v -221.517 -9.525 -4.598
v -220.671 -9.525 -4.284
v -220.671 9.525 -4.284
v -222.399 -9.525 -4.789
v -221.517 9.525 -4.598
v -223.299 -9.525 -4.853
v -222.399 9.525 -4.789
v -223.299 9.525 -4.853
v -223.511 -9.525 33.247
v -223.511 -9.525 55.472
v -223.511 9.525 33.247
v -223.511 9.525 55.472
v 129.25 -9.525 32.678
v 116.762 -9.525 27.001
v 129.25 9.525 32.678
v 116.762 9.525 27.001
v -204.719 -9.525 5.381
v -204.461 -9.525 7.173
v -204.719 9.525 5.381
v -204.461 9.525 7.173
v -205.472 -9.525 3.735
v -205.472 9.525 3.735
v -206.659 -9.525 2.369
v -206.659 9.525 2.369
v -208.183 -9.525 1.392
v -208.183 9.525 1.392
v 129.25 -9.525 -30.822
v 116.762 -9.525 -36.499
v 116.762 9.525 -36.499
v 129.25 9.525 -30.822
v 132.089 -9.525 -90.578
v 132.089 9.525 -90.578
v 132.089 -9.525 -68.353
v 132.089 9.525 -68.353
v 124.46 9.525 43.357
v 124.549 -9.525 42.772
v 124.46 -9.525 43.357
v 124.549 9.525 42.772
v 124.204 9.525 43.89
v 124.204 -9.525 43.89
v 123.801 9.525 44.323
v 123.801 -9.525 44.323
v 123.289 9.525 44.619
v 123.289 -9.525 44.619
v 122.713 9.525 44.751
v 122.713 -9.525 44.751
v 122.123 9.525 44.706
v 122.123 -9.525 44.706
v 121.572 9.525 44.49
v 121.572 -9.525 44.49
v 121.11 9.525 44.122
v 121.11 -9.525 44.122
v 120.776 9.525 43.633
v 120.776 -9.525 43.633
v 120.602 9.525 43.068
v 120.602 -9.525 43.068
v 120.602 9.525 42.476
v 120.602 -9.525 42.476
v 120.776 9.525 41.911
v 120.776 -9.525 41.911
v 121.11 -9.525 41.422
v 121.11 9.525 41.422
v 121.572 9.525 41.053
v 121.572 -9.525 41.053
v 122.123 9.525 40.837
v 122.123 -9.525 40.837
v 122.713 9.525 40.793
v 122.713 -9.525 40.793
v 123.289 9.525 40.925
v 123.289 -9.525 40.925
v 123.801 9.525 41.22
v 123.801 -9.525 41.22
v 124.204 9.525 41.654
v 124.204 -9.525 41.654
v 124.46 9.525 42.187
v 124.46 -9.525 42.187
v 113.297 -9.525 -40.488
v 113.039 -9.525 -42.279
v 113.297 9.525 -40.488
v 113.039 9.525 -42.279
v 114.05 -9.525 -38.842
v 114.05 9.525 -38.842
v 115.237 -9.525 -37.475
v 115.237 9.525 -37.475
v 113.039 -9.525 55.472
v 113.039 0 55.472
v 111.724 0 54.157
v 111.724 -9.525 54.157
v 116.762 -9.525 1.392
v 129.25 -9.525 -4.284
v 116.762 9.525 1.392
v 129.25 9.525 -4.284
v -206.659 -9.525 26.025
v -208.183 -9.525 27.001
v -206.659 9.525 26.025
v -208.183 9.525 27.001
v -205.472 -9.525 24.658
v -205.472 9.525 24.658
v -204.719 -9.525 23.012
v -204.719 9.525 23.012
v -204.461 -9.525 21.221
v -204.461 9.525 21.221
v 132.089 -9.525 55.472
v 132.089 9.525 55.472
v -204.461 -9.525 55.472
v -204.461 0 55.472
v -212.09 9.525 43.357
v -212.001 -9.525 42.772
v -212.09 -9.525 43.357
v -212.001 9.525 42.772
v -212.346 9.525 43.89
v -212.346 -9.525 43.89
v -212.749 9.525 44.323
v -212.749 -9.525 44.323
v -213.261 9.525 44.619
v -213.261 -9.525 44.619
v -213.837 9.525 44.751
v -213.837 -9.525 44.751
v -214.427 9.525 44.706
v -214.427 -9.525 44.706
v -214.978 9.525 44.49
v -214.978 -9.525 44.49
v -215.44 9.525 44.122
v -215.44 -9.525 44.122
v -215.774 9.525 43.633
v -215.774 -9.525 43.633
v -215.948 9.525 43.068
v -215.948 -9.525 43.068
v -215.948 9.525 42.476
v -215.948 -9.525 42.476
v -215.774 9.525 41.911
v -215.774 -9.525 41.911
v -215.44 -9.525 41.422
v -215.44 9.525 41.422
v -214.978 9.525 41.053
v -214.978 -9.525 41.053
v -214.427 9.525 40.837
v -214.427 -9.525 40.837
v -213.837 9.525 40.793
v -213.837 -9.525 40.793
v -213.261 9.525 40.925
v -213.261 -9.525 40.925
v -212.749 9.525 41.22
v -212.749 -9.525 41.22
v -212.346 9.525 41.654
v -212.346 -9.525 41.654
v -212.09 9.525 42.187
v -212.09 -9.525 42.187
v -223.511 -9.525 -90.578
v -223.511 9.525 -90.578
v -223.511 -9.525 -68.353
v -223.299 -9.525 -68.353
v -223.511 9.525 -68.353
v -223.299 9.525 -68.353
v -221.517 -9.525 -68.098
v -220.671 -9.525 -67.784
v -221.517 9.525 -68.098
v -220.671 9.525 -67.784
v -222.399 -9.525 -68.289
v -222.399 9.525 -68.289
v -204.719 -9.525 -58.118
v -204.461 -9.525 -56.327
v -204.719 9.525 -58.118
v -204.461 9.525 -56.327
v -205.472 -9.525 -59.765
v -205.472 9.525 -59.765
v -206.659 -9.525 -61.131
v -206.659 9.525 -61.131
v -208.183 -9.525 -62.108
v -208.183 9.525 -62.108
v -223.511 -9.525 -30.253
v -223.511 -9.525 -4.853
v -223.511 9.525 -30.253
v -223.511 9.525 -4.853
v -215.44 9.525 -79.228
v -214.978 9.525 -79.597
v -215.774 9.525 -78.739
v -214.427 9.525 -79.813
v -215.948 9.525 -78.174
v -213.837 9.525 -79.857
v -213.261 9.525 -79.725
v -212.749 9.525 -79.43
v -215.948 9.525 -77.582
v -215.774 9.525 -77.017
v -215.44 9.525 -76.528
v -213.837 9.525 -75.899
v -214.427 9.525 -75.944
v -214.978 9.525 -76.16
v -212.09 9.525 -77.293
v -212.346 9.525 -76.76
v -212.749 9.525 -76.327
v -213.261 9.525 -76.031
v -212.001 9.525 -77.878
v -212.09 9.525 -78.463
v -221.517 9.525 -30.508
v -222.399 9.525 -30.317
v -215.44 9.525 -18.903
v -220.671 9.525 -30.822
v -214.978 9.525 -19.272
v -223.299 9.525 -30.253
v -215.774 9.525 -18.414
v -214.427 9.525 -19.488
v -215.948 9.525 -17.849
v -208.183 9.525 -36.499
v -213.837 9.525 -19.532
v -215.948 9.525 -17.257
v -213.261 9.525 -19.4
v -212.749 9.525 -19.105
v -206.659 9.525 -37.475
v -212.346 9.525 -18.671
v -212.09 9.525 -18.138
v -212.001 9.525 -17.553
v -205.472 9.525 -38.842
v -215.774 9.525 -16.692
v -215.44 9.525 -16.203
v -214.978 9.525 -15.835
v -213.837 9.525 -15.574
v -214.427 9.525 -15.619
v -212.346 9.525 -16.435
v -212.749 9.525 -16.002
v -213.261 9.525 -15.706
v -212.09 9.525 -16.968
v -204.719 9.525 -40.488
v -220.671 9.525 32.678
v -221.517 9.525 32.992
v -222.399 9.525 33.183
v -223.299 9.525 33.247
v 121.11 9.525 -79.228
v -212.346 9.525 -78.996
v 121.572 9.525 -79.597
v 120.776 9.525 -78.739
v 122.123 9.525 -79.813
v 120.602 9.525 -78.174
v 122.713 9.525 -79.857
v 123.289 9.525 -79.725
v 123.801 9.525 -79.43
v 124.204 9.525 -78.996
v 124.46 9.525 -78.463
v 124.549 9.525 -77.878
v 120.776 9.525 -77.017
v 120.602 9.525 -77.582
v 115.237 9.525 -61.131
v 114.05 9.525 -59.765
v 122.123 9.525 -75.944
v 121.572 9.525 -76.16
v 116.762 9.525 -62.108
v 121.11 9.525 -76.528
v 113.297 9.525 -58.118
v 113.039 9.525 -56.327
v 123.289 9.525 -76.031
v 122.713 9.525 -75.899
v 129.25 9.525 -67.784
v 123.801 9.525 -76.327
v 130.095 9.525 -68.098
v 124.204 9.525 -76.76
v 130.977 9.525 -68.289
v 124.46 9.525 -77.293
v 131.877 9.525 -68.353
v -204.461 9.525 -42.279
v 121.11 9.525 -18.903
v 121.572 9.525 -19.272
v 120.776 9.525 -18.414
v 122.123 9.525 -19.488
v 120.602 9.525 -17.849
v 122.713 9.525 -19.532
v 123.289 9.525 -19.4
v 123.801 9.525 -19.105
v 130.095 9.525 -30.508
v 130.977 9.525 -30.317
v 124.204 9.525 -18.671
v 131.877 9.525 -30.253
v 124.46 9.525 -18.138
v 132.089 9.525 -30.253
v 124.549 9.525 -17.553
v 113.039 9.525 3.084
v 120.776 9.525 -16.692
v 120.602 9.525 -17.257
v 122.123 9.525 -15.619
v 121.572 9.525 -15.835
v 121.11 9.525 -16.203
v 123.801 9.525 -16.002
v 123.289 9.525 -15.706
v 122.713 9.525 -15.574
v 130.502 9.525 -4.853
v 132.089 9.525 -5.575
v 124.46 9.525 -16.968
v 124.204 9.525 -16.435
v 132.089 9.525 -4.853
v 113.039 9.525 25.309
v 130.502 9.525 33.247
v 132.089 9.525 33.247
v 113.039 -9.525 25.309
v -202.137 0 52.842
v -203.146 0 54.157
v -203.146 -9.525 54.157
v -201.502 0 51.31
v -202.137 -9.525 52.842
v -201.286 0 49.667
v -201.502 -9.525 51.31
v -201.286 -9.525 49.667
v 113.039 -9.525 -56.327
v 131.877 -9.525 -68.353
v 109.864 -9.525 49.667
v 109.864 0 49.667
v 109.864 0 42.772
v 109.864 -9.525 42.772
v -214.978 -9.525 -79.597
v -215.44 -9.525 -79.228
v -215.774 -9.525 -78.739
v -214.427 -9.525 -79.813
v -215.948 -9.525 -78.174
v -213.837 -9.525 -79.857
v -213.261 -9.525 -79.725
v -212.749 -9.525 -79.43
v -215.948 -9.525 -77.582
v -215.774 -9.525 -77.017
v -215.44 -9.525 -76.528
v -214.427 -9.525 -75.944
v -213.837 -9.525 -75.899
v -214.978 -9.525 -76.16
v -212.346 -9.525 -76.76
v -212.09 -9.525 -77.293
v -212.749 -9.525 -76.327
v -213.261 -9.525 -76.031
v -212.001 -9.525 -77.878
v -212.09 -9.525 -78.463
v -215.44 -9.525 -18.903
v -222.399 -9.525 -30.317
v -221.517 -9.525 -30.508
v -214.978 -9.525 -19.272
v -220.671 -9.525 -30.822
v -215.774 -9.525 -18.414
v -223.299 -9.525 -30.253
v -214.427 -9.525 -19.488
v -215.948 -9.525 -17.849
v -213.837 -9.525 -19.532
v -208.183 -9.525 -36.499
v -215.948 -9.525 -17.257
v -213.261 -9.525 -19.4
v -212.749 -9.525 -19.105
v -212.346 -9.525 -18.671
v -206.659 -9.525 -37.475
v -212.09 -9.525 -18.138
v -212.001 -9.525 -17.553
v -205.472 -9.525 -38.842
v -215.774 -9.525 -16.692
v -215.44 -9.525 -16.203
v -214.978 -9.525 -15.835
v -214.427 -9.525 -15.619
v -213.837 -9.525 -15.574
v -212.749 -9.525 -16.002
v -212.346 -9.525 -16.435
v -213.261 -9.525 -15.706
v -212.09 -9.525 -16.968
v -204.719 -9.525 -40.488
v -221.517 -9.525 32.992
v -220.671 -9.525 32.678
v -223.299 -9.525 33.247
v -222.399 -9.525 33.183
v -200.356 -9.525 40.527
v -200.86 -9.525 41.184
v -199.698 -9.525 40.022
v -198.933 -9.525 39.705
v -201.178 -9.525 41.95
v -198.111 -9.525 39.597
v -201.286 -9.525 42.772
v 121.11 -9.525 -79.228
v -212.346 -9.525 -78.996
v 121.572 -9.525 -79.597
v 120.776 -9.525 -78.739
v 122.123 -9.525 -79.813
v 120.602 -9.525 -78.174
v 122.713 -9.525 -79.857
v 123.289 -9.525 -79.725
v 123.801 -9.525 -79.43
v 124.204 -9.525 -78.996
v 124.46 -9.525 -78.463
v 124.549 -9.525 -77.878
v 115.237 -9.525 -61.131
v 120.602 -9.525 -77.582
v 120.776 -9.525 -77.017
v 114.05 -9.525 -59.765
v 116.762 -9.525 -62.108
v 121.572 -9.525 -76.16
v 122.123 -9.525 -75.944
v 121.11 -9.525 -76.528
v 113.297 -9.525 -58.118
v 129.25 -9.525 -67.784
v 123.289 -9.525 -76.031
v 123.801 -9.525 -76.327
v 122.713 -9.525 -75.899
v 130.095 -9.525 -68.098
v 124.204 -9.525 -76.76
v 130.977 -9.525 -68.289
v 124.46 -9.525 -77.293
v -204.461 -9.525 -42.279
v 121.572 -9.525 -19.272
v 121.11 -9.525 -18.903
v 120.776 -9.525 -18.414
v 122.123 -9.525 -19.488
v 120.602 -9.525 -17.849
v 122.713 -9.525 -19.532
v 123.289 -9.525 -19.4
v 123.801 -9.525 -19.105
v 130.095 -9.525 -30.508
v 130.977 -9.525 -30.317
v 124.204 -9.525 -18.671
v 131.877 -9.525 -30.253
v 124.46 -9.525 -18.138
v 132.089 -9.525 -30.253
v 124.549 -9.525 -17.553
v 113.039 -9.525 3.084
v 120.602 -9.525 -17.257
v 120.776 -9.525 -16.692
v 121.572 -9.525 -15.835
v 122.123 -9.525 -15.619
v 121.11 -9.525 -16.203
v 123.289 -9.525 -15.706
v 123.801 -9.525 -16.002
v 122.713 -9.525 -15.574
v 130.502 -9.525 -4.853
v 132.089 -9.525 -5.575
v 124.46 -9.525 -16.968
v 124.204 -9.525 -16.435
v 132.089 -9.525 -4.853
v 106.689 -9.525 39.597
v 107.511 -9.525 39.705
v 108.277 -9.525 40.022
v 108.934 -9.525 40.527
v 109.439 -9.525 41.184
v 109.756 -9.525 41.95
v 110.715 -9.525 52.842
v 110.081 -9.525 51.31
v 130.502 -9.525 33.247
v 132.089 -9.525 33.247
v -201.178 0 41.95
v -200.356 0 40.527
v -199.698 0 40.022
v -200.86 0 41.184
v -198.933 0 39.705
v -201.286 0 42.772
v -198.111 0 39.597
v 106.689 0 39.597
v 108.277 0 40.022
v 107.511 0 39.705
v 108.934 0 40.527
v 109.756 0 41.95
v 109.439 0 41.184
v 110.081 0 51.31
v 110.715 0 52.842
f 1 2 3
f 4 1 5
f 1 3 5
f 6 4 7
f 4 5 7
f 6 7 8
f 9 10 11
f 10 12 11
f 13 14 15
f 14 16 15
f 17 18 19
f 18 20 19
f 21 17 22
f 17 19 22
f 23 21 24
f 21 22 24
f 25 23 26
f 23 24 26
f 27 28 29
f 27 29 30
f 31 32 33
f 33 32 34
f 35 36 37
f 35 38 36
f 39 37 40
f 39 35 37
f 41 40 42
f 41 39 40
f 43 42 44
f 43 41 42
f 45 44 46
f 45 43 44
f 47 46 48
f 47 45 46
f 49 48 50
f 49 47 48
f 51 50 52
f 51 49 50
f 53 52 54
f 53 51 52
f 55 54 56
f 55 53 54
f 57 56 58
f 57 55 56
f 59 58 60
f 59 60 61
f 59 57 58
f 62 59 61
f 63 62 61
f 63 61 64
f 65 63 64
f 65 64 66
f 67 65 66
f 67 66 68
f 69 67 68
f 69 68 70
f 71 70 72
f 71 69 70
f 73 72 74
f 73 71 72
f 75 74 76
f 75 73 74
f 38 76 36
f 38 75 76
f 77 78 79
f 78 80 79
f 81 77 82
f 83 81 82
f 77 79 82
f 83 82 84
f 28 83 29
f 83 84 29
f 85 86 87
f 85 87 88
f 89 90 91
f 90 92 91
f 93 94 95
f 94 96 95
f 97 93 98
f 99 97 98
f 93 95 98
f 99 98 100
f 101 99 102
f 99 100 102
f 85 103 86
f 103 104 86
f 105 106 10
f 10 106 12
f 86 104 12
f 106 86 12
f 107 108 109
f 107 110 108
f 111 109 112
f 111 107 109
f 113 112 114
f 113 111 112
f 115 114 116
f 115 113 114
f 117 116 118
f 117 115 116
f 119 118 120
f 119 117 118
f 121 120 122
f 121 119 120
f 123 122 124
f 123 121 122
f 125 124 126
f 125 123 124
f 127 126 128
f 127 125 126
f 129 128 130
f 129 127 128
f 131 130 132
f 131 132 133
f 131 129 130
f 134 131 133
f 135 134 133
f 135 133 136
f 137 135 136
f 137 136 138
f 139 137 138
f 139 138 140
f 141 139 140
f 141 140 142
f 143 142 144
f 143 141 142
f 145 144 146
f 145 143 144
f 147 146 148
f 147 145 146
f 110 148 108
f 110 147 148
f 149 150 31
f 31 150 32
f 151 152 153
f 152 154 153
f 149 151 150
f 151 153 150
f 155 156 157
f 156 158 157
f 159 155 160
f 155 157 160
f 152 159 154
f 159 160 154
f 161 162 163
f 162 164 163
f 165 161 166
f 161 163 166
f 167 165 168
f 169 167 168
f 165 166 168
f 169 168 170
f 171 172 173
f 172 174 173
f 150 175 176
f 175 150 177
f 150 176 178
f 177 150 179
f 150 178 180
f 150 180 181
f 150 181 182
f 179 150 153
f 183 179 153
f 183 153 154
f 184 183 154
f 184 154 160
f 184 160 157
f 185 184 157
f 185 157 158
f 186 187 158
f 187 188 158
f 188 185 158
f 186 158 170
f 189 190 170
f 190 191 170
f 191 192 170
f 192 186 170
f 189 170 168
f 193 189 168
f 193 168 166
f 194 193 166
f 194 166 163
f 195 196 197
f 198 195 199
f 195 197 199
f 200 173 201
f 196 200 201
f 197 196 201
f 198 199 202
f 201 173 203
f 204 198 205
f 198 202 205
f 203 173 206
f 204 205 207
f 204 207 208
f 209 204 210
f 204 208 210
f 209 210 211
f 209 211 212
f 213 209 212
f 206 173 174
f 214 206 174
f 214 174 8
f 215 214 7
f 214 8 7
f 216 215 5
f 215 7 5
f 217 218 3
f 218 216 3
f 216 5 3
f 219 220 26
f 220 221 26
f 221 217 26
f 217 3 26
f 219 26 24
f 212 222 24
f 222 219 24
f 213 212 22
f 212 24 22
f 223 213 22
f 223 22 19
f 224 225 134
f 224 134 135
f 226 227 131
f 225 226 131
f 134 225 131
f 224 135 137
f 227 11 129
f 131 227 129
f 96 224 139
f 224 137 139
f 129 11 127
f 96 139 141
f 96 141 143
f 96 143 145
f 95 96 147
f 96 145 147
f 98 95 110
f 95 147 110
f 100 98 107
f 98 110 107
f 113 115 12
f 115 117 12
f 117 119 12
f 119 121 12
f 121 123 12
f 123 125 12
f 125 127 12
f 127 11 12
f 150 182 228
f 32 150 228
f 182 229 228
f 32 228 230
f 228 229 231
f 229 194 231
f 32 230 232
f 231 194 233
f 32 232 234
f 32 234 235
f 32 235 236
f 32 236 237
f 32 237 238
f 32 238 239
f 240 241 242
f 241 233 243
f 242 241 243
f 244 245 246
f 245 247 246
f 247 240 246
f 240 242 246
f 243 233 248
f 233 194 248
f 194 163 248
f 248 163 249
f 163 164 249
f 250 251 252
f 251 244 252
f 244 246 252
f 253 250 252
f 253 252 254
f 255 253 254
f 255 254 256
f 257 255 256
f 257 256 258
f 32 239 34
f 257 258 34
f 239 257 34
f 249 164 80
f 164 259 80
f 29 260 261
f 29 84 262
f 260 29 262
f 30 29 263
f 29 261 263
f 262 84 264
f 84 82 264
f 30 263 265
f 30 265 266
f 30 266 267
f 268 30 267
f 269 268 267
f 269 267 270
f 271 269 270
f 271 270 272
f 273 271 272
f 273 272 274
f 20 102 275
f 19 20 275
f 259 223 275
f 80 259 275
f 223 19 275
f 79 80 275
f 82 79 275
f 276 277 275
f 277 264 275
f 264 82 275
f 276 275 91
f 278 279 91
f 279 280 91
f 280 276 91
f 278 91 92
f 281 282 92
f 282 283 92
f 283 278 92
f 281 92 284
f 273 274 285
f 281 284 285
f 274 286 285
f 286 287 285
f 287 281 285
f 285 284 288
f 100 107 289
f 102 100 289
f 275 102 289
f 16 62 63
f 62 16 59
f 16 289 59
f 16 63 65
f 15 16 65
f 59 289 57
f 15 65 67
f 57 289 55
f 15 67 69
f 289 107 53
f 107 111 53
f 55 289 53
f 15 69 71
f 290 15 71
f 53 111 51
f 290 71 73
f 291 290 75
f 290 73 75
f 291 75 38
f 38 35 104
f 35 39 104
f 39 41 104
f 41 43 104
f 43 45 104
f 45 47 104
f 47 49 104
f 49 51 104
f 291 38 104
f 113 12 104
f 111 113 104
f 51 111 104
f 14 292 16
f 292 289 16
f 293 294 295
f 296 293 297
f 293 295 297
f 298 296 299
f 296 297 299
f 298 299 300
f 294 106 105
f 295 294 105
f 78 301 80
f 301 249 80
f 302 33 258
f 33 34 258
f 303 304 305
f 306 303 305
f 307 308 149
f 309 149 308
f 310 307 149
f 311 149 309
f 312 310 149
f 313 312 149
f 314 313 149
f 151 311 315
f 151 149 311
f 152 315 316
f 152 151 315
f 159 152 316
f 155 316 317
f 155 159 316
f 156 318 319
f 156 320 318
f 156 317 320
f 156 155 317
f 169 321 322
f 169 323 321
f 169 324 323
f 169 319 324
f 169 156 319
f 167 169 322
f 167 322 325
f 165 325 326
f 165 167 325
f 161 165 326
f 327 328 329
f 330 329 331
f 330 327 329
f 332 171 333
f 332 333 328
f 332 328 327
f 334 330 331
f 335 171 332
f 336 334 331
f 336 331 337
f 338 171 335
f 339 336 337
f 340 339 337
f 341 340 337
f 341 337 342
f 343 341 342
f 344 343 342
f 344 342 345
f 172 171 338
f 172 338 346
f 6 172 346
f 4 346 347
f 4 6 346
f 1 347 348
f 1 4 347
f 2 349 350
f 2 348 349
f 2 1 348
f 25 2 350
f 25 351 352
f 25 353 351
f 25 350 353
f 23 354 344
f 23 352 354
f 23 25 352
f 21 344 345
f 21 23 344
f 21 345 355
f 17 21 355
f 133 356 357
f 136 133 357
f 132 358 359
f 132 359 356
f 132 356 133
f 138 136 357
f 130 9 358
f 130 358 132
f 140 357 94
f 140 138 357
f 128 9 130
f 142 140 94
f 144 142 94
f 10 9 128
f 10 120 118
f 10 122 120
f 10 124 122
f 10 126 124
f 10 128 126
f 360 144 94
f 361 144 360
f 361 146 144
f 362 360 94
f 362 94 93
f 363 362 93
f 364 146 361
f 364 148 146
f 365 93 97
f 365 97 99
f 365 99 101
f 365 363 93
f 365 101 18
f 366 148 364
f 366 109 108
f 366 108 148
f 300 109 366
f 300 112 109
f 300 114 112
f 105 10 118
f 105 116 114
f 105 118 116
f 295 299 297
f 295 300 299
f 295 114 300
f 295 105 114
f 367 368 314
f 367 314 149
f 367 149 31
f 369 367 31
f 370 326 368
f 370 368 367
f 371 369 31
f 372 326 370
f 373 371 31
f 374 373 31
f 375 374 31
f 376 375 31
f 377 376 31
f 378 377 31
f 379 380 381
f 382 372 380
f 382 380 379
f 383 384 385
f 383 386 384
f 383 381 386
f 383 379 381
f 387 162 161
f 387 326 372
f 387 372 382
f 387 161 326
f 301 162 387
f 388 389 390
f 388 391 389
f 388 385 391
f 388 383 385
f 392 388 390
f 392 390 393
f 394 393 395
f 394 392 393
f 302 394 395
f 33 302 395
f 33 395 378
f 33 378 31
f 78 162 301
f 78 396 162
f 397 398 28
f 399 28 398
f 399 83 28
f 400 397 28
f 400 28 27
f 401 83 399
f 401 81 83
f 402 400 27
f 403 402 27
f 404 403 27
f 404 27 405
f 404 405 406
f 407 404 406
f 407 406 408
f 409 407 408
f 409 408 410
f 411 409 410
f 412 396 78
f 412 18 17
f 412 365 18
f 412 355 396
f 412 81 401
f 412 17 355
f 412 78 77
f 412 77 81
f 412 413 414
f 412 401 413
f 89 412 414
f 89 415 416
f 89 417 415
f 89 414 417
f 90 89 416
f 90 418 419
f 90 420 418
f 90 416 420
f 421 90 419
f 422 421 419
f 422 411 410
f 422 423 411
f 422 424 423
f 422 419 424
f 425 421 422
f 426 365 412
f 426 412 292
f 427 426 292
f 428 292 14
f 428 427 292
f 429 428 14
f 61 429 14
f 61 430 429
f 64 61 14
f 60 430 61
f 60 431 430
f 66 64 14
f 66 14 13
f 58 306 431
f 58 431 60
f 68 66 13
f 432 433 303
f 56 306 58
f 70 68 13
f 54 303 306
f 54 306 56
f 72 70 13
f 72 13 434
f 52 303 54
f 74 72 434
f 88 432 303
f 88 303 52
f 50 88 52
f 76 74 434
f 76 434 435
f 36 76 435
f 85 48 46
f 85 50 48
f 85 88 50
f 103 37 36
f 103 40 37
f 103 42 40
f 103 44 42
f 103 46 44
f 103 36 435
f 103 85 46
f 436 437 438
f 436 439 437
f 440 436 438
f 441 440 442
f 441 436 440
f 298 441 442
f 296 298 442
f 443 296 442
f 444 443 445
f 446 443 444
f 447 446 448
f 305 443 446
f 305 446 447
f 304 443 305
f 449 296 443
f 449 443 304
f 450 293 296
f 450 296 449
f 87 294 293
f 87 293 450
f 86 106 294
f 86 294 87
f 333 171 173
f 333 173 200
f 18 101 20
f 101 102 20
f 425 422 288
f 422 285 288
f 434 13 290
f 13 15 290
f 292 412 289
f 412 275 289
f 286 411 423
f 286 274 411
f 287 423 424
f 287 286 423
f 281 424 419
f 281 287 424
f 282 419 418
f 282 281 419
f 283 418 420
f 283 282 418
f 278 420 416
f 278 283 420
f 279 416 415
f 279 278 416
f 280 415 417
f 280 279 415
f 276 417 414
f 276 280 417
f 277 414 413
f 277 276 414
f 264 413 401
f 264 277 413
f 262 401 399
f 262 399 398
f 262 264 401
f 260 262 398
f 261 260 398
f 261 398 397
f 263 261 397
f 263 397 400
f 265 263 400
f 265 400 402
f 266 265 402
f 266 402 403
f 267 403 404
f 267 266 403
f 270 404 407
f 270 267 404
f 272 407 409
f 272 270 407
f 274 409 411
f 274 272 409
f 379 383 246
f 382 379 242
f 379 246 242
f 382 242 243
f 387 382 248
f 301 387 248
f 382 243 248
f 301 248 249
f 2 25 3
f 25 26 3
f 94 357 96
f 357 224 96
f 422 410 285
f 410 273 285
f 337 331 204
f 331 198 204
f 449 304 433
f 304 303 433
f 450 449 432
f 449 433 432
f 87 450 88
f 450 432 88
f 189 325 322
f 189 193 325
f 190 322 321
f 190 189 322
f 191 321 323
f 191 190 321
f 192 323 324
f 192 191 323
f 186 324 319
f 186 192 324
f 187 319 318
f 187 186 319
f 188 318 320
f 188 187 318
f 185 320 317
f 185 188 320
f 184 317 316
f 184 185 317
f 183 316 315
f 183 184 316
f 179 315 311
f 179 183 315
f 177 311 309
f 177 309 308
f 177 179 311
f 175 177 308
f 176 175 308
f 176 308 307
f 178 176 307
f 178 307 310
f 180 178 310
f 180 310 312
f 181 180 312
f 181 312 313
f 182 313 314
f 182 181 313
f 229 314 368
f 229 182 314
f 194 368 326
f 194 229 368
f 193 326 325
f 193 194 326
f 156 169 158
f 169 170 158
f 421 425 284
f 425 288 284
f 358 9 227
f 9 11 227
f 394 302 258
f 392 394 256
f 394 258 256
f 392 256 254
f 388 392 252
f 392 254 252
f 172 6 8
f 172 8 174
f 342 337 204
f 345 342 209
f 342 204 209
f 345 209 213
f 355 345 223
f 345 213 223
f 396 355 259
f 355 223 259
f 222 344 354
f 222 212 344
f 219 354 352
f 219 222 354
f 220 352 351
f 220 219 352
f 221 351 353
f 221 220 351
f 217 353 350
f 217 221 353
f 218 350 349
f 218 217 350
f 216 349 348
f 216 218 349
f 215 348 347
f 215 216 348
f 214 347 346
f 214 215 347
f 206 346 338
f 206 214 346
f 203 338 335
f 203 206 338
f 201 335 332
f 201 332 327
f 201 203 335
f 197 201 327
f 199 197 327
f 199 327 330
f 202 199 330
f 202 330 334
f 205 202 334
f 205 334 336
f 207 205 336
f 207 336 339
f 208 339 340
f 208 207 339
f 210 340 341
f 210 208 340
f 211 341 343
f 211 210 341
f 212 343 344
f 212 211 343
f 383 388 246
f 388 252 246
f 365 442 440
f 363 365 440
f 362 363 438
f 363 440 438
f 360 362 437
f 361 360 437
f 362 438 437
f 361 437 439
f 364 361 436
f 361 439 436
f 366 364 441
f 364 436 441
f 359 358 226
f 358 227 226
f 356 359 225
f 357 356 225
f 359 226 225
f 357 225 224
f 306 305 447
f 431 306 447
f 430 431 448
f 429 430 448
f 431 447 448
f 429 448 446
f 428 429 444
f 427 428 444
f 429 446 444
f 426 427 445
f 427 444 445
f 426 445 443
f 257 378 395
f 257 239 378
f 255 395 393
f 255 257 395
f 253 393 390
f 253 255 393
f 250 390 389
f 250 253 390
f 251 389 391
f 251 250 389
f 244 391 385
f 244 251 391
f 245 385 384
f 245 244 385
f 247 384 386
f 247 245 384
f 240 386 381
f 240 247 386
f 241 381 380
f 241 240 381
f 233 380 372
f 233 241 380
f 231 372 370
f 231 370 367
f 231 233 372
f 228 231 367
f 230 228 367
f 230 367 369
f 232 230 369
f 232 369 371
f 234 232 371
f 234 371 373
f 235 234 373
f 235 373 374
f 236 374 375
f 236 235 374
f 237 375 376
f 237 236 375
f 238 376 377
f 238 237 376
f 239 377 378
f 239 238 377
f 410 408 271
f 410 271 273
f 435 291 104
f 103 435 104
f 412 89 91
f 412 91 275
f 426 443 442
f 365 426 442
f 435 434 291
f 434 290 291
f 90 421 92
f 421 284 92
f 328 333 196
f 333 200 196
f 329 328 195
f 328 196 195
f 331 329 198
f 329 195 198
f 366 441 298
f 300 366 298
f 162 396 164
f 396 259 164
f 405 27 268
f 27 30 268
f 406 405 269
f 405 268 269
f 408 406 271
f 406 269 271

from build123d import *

# Parameters (mm, degrees)
F0_R     = 1.984375
F1_DEPTH = 9.525
F2_DEPTH = 9.525
F3_SIZE  = 3.175
F4_R     = 6.35


# Not quite as in the source:
# - ends of sketch curves that miss each other by under 0.0002 mm in the source are joined


with BuildPart() as f1:
    # F0 (on Front) → F1 (new body)
    with BuildSketch(Plane.XZ):
        with BuildLine():
            ThreePointArc((106.6892375248, 39.5968594302), (108.9343015551, 40.5267953999), (109.8642375248, 42.7718594302))
            Line((109.8642375248, 42.7718594302), (109.8642375248, 55.4718594302))
            Line((109.8642375248, 55.4718594302), (-201.2857624752, 55.4718594302))
            Line((-201.2857624752, 55.4718594302), (-201.2857624752, 42.7718594302))
            ThreePointArc((-201.2857624752, 42.7718594302), (-200.3558265055, 40.5267953999), (-198.1107624752, 39.5968594302))
            Line((-198.1107624752, 39.5968594302), (106.6892375248, 39.5968594302))
        make_face()
        with BuildLine():
            Line((109.8642375248, 55.4718594302), (109.8642375248, 42.7718594302))
            ThreePointArc((109.8642375248, 42.7718594302), (108.9343015551, 40.5267953999), (106.6892375248, 39.5968594302))
            Line((106.6892375248, 39.5968594302), (-198.1107624752, 39.5968594302))
            ThreePointArc((-198.1107624752, 39.5968594302), (-200.3558265055, 40.5267953999), (-201.2857624752, 42.7718594302))
            Line((-201.2857624752, 42.7718594302), (-201.2857624752, 55.4718594302))
            Line((-201.2857624752, 55.4718594302), (-223.5107624752, 55.4718594302))
            Line((-223.5107624752, 55.4718594302), (-223.5107624752, 33.2468594302))
            Line((-223.5107624752, 33.2468594302), (-223.2986885503, 33.2468594302))
            ThreePointArc((-223.2986885503, 33.2468594302), (-221.9543922864, 33.1029344825), (-220.6710339026, 32.6776838569))
            Line((-220.6710339026, 32.6776838569), (-208.1831078275, 27.0013383101))
            ThreePointArc((-208.1831078275, 27.0013383101), (-205.471843717, 24.6583106333), (-204.4607624752, 21.2205138834))
            Line((-204.4607624752, 21.2205138834), (-204.4607624752, 7.1731958926))
            ThreePointArc((-204.4607624752, 7.1731958926), (-205.4718446589, 3.7353976799), (-208.1831109951, 1.392370026))
            Line((-208.1831109951, 1.392370026), (-220.6710352489, -4.2839664363))
            ThreePointArc((-220.6710352489, -4.2839664363), (-221.9543921654, -4.7092159904), (-223.298686729, -4.8531405698))
            Line((-223.298686729, -4.8531405698), (-223.5107370752, -4.8531405698))
            Line((-223.5107370752, -4.8531405698), (-223.5107624752, -30.2531405698))
            Line((-223.5107624752, -30.2531405698), (-223.298686729, -30.2531405698))
            ThreePointArc((-223.298686729, -30.2531405698), (-221.9543921654, -30.3970651492), (-220.6710352489, -30.8223147033))
            Line((-220.6710352489, -30.8223147033), (-208.1831109951, -36.4986511657))
            ThreePointArc((-208.1831109951, -36.4986511657), (-205.4718446589, -38.8416788196), (-204.4607624752, -42.2794770322))
            Line((-204.4607624752, -42.2794770322), (-204.4607624752, -56.326795023))
            ThreePointArc((-204.4607624752, -56.326795023), (-205.471843717, -59.7645917729), (-208.1831078275, -62.1076194497))
            Line((-208.1831078275, -62.1076194497), (-220.6710339026, -67.7839649965))
            ThreePointArc((-220.6710339026, -67.7839649965), (-221.9543922864, -68.2092156221), (-223.2986885503, -68.3531405698))
            Line((-223.2986885503, -68.3531405698), (-223.5107370752, -68.3531405698))
            Line((-223.5107370752, -68.3531405698), (-223.5107624752, -90.5781405698))
            Line((-223.5107624752, -90.5781405698), (132.0892375248, -90.5781405698))
            Line((132.0892375248, -90.5781405698), (132.0892375248, -68.3531405698))
            Line((132.0892375248, -68.3531405698), (131.8771635999, -68.3531405698))
            ThreePointArc((131.8771635999, -68.3531405698), (130.532867336, -68.2092156221), (129.2495089522, -67.7839649965))
            Line((129.2495089522, -67.7839649965), (116.7615828771, -62.1076194497))
            ThreePointArc((116.7615828771, -62.1076194497), (114.0503187666, -59.7645917729), (113.0392375248, -56.326795023))
            Line((113.0392375248, -56.326795023), (113.0392375248, -42.2794770322))
            ThreePointArc((113.0392375248, -42.2794770322), (114.0503197085, -38.8416788196), (116.7615860447, -36.4986511657))
            Line((116.7615860447, -36.4986511657), (129.2495102985, -30.8223147033))
            ThreePointArc((129.2495102985, -30.8223147033), (130.5328672149, -30.3970651492), (131.8771617786, -30.2531405698))
            Line((131.8771617786, -30.2531405698), (132.0892121248, -30.2531405698))
            Line((132.0892121248, -30.2531405698), (132.0892375248, -5.5747531892))
            Line((132.0892375248, -5.5747531892), (130.5016917914, -4.8531405698))
            Line((130.5016917914, -4.8531405698), (129.2495102985, -4.2839664363))
            Line((129.2495102985, -4.2839664363), (116.7615860447, 1.392370026))
            Line((116.7615860447, 1.392370026), (113.0392375248, 3.0843487889))
            Line((113.0392375248, 3.0843487889), (113.0392375248, 7.1731958926))
            Line((113.0392375248, 7.1731958926), (113.0392375248, 21.2205138834))
            Line((113.0392375248, 21.2205138834), (113.0392375248, 25.3093700715))
            Line((113.0392375248, 25.3093700715), (116.7615794549, 27.001345839))
            Line((116.7615794549, 27.001345839), (129.2495086403, 32.677684543))
            Line((129.2495086403, 32.677684543), (130.5016917914, 33.2468594302))
            Line((130.5016917914, 33.2468594302), (132.0892375248, 33.9684720496))
            Line((132.0892375248, 33.9684720496), (132.0892375248, 55.4718594302))
            Line((132.0892375248, 55.4718594302), (109.8642375248, 55.4718594302))
        make_face()
        with Locations((-213.9857624752, -77.8781405698)):
            Circle(F0_R, mode=Mode.SUBTRACT)
        with Locations((122.5642375248, -77.8781405698)):
            Circle(F0_R, mode=Mode.SUBTRACT)
        with Locations((-213.9857624752, -17.5531402737)):
            Circle(F0_R, mode=Mode.SUBTRACT)
        with Locations((-213.9857624752, 42.7718594302)):
            Circle(F0_R, mode=Mode.SUBTRACT)
        with Locations((122.5642375248, -17.5531402737)):
            Circle(F0_R, mode=Mode.SUBTRACT)
        with Locations((122.5642375248, 42.7718594302)):
            Circle(F0_R, mode=Mode.SUBTRACT)
        Polygon((132.0892375248, 33.2468594302), (132.0892375248, 33.9684720496), (130.5016917914, 33.2468594302), (131.8771635999, 33.2468594302), align=None)
        Polygon((132.0892375248, -5.5747531892), (132.0892375248, -4.8531405698), (131.8771617786, -4.8531405698), (130.5016917914, -4.8531405698), align=None)
    extrude(amount=-F1_DEPTH)

    # F0 (on Front) → F2 (join)
    with BuildSketch(Plane.XZ):
        with BuildLine():
            Line((109.8642375248, 55.4718594302), (109.8642375248, 42.7718594302))
            ThreePointArc((109.8642375248, 42.7718594302), (108.9343015551, 40.5267953999), (106.6892375248, 39.5968594302))
            Line((106.6892375248, 39.5968594302), (-198.1107624752, 39.5968594302))
            ThreePointArc((-198.1107624752, 39.5968594302), (-200.3558265055, 40.5267953999), (-201.2857624752, 42.7718594302))
            Line((-201.2857624752, 42.7718594302), (-201.2857624752, 55.4718594302))
            Line((-201.2857624752, 55.4718594302), (-223.5107624752, 55.4718594302))
            Line((-223.5107624752, 55.4718594302), (-223.5107624752, 33.2468594302))
            Line((-223.5107624752, 33.2468594302), (-223.2986885503, 33.2468594302))
            ThreePointArc((-223.2986885503, 33.2468594302), (-221.9543922864, 33.1029344825), (-220.6710339026, 32.6776838569))
            Line((-220.6710339026, 32.6776838569), (-208.1831078275, 27.0013383101))
            ThreePointArc((-208.1831078275, 27.0013383101), (-205.471843717, 24.6583106333), (-204.4607624752, 21.2205138834))
            Line((-204.4607624752, 21.2205138834), (-204.4607624752, 7.1731958926))
            ThreePointArc((-204.4607624752, 7.1731958926), (-205.4718446589, 3.7353976799), (-208.1831109951, 1.392370026))
            Line((-208.1831109951, 1.392370026), (-220.6710352489, -4.2839664363))
            ThreePointArc((-220.6710352489, -4.2839664363), (-221.9543921654, -4.7092159904), (-223.298686729, -4.8531405698))
            Line((-223.298686729, -4.8531405698), (-223.5107370752, -4.8531405698))
            Line((-223.5107370752, -4.8531405698), (-223.5107624752, -30.2531405698))
            Line((-223.5107624752, -30.2531405698), (-223.298686729, -30.2531405698))
            ThreePointArc((-223.298686729, -30.2531405698), (-221.9543921654, -30.3970651492), (-220.6710352489, -30.8223147033))
            Line((-220.6710352489, -30.8223147033), (-208.1831109951, -36.4986511657))
            ThreePointArc((-208.1831109951, -36.4986511657), (-205.4718446589, -38.8416788196), (-204.4607624752, -42.2794770322))
            Line((-204.4607624752, -42.2794770322), (-204.4607624752, -56.326795023))
            ThreePointArc((-204.4607624752, -56.326795023), (-205.471843717, -59.7645917729), (-208.1831078275, -62.1076194497))
            Line((-208.1831078275, -62.1076194497), (-220.6710339026, -67.7839649965))
            ThreePointArc((-220.6710339026, -67.7839649965), (-221.9543922864, -68.2092156221), (-223.2986885503, -68.3531405698))
            Line((-223.2986885503, -68.3531405698), (-223.5107370752, -68.3531405698))
            Line((-223.5107370752, -68.3531405698), (-223.5107624752, -90.5781405698))
            Line((-223.5107624752, -90.5781405698), (132.0892375248, -90.5781405698))
            Line((132.0892375248, -90.5781405698), (132.0892375248, -68.3531405698))
            Line((132.0892375248, -68.3531405698), (131.8771635999, -68.3531405698))
            ThreePointArc((131.8771635999, -68.3531405698), (130.532867336, -68.2092156221), (129.2495089522, -67.7839649965))
            Line((129.2495089522, -67.7839649965), (116.7615828771, -62.1076194497))
            ThreePointArc((116.7615828771, -62.1076194497), (114.0503187666, -59.7645917729), (113.0392375248, -56.326795023))
            Line((113.0392375248, -56.326795023), (113.0392375248, -42.2794770322))
            ThreePointArc((113.0392375248, -42.2794770322), (114.0503197085, -38.8416788196), (116.7615860447, -36.4986511657))
            Line((116.7615860447, -36.4986511657), (129.2495102985, -30.8223147033))
            ThreePointArc((129.2495102985, -30.8223147033), (130.5328672149, -30.3970651492), (131.8771617786, -30.2531405698))
            Line((131.8771617786, -30.2531405698), (132.0892121248, -30.2531405698))
            Line((132.0892121248, -30.2531405698), (132.0892375248, -5.5747531892))
            Line((132.0892375248, -5.5747531892), (130.5016917914, -4.8531405698))
            Line((130.5016917914, -4.8531405698), (129.2495102985, -4.2839664363))
            Line((129.2495102985, -4.2839664363), (116.7615860447, 1.392370026))
            Line((116.7615860447, 1.392370026), (113.0392375248, 3.0843487889))
            Line((113.0392375248, 3.0843487889), (113.0392375248, 7.1731958926))
            Line((113.0392375248, 7.1731958926), (113.0392375248, 21.2205138834))
            Line((113.0392375248, 21.2205138834), (113.0392375248, 25.3093700715))
            Line((113.0392375248, 25.3093700715), (116.7615794549, 27.001345839))
            Line((116.7615794549, 27.001345839), (129.2495086403, 32.677684543))
            Line((129.2495086403, 32.677684543), (130.5016917914, 33.2468594302))
            Line((130.5016917914, 33.2468594302), (132.0892375248, 33.9684720496))
            Line((132.0892375248, 33.9684720496), (132.0892375248, 55.4718594302))
            Line((132.0892375248, 55.4718594302), (109.8642375248, 55.4718594302))
        make_face()
        with Locations((-213.9857624752, -77.8781405698)):
            Circle(F0_R, mode=Mode.SUBTRACT)
        with Locations((122.5642375248, -77.8781405698)):
            Circle(F0_R, mode=Mode.SUBTRACT)
        with Locations((-213.9857624752, -17.5531402737)):
            Circle(F0_R, mode=Mode.SUBTRACT)
        with Locations((-213.9857624752, 42.7718594302)):
            Circle(F0_R, mode=Mode.SUBTRACT)
        with Locations((122.5642375248, -17.5531402737)):
            Circle(F0_R, mode=Mode.SUBTRACT)
        with Locations((122.5642375248, 42.7718594302)):
            Circle(F0_R, mode=Mode.SUBTRACT)
        Polygon((132.0892375248, 33.2468594302), (132.0892375248, 33.9684720496), (130.5016917914, 33.2468594302), (131.8771635999, 33.2468594302), align=None)
        Polygon((132.0892375248, -5.5747531892), (132.0892375248, -4.8531405698), (131.8771617786, -4.8531405698), (130.5016917914, -4.8531405698), align=None)
    extrude(amount=F2_DEPTH)

    # F3
    f3_edges = [f1.edges().sort_by_distance(p)[0] for p in [
        (-201.285762, -4.7625, 55.471859),
        (109.864238, -4.7625, 55.471859),
    ]]
    chamfer(f3_edges, length=F3_SIZE)

    # F4
    f4_edges = [f1.edges().sort_by_distance(p)[0] for p in [
        (109.864238, -4.7625, 52.296859),
        (-201.285762, -4.7625, 52.296859),
    ]]
    fillet(f4_edges, radius=F4_R)


solid = f1.part
